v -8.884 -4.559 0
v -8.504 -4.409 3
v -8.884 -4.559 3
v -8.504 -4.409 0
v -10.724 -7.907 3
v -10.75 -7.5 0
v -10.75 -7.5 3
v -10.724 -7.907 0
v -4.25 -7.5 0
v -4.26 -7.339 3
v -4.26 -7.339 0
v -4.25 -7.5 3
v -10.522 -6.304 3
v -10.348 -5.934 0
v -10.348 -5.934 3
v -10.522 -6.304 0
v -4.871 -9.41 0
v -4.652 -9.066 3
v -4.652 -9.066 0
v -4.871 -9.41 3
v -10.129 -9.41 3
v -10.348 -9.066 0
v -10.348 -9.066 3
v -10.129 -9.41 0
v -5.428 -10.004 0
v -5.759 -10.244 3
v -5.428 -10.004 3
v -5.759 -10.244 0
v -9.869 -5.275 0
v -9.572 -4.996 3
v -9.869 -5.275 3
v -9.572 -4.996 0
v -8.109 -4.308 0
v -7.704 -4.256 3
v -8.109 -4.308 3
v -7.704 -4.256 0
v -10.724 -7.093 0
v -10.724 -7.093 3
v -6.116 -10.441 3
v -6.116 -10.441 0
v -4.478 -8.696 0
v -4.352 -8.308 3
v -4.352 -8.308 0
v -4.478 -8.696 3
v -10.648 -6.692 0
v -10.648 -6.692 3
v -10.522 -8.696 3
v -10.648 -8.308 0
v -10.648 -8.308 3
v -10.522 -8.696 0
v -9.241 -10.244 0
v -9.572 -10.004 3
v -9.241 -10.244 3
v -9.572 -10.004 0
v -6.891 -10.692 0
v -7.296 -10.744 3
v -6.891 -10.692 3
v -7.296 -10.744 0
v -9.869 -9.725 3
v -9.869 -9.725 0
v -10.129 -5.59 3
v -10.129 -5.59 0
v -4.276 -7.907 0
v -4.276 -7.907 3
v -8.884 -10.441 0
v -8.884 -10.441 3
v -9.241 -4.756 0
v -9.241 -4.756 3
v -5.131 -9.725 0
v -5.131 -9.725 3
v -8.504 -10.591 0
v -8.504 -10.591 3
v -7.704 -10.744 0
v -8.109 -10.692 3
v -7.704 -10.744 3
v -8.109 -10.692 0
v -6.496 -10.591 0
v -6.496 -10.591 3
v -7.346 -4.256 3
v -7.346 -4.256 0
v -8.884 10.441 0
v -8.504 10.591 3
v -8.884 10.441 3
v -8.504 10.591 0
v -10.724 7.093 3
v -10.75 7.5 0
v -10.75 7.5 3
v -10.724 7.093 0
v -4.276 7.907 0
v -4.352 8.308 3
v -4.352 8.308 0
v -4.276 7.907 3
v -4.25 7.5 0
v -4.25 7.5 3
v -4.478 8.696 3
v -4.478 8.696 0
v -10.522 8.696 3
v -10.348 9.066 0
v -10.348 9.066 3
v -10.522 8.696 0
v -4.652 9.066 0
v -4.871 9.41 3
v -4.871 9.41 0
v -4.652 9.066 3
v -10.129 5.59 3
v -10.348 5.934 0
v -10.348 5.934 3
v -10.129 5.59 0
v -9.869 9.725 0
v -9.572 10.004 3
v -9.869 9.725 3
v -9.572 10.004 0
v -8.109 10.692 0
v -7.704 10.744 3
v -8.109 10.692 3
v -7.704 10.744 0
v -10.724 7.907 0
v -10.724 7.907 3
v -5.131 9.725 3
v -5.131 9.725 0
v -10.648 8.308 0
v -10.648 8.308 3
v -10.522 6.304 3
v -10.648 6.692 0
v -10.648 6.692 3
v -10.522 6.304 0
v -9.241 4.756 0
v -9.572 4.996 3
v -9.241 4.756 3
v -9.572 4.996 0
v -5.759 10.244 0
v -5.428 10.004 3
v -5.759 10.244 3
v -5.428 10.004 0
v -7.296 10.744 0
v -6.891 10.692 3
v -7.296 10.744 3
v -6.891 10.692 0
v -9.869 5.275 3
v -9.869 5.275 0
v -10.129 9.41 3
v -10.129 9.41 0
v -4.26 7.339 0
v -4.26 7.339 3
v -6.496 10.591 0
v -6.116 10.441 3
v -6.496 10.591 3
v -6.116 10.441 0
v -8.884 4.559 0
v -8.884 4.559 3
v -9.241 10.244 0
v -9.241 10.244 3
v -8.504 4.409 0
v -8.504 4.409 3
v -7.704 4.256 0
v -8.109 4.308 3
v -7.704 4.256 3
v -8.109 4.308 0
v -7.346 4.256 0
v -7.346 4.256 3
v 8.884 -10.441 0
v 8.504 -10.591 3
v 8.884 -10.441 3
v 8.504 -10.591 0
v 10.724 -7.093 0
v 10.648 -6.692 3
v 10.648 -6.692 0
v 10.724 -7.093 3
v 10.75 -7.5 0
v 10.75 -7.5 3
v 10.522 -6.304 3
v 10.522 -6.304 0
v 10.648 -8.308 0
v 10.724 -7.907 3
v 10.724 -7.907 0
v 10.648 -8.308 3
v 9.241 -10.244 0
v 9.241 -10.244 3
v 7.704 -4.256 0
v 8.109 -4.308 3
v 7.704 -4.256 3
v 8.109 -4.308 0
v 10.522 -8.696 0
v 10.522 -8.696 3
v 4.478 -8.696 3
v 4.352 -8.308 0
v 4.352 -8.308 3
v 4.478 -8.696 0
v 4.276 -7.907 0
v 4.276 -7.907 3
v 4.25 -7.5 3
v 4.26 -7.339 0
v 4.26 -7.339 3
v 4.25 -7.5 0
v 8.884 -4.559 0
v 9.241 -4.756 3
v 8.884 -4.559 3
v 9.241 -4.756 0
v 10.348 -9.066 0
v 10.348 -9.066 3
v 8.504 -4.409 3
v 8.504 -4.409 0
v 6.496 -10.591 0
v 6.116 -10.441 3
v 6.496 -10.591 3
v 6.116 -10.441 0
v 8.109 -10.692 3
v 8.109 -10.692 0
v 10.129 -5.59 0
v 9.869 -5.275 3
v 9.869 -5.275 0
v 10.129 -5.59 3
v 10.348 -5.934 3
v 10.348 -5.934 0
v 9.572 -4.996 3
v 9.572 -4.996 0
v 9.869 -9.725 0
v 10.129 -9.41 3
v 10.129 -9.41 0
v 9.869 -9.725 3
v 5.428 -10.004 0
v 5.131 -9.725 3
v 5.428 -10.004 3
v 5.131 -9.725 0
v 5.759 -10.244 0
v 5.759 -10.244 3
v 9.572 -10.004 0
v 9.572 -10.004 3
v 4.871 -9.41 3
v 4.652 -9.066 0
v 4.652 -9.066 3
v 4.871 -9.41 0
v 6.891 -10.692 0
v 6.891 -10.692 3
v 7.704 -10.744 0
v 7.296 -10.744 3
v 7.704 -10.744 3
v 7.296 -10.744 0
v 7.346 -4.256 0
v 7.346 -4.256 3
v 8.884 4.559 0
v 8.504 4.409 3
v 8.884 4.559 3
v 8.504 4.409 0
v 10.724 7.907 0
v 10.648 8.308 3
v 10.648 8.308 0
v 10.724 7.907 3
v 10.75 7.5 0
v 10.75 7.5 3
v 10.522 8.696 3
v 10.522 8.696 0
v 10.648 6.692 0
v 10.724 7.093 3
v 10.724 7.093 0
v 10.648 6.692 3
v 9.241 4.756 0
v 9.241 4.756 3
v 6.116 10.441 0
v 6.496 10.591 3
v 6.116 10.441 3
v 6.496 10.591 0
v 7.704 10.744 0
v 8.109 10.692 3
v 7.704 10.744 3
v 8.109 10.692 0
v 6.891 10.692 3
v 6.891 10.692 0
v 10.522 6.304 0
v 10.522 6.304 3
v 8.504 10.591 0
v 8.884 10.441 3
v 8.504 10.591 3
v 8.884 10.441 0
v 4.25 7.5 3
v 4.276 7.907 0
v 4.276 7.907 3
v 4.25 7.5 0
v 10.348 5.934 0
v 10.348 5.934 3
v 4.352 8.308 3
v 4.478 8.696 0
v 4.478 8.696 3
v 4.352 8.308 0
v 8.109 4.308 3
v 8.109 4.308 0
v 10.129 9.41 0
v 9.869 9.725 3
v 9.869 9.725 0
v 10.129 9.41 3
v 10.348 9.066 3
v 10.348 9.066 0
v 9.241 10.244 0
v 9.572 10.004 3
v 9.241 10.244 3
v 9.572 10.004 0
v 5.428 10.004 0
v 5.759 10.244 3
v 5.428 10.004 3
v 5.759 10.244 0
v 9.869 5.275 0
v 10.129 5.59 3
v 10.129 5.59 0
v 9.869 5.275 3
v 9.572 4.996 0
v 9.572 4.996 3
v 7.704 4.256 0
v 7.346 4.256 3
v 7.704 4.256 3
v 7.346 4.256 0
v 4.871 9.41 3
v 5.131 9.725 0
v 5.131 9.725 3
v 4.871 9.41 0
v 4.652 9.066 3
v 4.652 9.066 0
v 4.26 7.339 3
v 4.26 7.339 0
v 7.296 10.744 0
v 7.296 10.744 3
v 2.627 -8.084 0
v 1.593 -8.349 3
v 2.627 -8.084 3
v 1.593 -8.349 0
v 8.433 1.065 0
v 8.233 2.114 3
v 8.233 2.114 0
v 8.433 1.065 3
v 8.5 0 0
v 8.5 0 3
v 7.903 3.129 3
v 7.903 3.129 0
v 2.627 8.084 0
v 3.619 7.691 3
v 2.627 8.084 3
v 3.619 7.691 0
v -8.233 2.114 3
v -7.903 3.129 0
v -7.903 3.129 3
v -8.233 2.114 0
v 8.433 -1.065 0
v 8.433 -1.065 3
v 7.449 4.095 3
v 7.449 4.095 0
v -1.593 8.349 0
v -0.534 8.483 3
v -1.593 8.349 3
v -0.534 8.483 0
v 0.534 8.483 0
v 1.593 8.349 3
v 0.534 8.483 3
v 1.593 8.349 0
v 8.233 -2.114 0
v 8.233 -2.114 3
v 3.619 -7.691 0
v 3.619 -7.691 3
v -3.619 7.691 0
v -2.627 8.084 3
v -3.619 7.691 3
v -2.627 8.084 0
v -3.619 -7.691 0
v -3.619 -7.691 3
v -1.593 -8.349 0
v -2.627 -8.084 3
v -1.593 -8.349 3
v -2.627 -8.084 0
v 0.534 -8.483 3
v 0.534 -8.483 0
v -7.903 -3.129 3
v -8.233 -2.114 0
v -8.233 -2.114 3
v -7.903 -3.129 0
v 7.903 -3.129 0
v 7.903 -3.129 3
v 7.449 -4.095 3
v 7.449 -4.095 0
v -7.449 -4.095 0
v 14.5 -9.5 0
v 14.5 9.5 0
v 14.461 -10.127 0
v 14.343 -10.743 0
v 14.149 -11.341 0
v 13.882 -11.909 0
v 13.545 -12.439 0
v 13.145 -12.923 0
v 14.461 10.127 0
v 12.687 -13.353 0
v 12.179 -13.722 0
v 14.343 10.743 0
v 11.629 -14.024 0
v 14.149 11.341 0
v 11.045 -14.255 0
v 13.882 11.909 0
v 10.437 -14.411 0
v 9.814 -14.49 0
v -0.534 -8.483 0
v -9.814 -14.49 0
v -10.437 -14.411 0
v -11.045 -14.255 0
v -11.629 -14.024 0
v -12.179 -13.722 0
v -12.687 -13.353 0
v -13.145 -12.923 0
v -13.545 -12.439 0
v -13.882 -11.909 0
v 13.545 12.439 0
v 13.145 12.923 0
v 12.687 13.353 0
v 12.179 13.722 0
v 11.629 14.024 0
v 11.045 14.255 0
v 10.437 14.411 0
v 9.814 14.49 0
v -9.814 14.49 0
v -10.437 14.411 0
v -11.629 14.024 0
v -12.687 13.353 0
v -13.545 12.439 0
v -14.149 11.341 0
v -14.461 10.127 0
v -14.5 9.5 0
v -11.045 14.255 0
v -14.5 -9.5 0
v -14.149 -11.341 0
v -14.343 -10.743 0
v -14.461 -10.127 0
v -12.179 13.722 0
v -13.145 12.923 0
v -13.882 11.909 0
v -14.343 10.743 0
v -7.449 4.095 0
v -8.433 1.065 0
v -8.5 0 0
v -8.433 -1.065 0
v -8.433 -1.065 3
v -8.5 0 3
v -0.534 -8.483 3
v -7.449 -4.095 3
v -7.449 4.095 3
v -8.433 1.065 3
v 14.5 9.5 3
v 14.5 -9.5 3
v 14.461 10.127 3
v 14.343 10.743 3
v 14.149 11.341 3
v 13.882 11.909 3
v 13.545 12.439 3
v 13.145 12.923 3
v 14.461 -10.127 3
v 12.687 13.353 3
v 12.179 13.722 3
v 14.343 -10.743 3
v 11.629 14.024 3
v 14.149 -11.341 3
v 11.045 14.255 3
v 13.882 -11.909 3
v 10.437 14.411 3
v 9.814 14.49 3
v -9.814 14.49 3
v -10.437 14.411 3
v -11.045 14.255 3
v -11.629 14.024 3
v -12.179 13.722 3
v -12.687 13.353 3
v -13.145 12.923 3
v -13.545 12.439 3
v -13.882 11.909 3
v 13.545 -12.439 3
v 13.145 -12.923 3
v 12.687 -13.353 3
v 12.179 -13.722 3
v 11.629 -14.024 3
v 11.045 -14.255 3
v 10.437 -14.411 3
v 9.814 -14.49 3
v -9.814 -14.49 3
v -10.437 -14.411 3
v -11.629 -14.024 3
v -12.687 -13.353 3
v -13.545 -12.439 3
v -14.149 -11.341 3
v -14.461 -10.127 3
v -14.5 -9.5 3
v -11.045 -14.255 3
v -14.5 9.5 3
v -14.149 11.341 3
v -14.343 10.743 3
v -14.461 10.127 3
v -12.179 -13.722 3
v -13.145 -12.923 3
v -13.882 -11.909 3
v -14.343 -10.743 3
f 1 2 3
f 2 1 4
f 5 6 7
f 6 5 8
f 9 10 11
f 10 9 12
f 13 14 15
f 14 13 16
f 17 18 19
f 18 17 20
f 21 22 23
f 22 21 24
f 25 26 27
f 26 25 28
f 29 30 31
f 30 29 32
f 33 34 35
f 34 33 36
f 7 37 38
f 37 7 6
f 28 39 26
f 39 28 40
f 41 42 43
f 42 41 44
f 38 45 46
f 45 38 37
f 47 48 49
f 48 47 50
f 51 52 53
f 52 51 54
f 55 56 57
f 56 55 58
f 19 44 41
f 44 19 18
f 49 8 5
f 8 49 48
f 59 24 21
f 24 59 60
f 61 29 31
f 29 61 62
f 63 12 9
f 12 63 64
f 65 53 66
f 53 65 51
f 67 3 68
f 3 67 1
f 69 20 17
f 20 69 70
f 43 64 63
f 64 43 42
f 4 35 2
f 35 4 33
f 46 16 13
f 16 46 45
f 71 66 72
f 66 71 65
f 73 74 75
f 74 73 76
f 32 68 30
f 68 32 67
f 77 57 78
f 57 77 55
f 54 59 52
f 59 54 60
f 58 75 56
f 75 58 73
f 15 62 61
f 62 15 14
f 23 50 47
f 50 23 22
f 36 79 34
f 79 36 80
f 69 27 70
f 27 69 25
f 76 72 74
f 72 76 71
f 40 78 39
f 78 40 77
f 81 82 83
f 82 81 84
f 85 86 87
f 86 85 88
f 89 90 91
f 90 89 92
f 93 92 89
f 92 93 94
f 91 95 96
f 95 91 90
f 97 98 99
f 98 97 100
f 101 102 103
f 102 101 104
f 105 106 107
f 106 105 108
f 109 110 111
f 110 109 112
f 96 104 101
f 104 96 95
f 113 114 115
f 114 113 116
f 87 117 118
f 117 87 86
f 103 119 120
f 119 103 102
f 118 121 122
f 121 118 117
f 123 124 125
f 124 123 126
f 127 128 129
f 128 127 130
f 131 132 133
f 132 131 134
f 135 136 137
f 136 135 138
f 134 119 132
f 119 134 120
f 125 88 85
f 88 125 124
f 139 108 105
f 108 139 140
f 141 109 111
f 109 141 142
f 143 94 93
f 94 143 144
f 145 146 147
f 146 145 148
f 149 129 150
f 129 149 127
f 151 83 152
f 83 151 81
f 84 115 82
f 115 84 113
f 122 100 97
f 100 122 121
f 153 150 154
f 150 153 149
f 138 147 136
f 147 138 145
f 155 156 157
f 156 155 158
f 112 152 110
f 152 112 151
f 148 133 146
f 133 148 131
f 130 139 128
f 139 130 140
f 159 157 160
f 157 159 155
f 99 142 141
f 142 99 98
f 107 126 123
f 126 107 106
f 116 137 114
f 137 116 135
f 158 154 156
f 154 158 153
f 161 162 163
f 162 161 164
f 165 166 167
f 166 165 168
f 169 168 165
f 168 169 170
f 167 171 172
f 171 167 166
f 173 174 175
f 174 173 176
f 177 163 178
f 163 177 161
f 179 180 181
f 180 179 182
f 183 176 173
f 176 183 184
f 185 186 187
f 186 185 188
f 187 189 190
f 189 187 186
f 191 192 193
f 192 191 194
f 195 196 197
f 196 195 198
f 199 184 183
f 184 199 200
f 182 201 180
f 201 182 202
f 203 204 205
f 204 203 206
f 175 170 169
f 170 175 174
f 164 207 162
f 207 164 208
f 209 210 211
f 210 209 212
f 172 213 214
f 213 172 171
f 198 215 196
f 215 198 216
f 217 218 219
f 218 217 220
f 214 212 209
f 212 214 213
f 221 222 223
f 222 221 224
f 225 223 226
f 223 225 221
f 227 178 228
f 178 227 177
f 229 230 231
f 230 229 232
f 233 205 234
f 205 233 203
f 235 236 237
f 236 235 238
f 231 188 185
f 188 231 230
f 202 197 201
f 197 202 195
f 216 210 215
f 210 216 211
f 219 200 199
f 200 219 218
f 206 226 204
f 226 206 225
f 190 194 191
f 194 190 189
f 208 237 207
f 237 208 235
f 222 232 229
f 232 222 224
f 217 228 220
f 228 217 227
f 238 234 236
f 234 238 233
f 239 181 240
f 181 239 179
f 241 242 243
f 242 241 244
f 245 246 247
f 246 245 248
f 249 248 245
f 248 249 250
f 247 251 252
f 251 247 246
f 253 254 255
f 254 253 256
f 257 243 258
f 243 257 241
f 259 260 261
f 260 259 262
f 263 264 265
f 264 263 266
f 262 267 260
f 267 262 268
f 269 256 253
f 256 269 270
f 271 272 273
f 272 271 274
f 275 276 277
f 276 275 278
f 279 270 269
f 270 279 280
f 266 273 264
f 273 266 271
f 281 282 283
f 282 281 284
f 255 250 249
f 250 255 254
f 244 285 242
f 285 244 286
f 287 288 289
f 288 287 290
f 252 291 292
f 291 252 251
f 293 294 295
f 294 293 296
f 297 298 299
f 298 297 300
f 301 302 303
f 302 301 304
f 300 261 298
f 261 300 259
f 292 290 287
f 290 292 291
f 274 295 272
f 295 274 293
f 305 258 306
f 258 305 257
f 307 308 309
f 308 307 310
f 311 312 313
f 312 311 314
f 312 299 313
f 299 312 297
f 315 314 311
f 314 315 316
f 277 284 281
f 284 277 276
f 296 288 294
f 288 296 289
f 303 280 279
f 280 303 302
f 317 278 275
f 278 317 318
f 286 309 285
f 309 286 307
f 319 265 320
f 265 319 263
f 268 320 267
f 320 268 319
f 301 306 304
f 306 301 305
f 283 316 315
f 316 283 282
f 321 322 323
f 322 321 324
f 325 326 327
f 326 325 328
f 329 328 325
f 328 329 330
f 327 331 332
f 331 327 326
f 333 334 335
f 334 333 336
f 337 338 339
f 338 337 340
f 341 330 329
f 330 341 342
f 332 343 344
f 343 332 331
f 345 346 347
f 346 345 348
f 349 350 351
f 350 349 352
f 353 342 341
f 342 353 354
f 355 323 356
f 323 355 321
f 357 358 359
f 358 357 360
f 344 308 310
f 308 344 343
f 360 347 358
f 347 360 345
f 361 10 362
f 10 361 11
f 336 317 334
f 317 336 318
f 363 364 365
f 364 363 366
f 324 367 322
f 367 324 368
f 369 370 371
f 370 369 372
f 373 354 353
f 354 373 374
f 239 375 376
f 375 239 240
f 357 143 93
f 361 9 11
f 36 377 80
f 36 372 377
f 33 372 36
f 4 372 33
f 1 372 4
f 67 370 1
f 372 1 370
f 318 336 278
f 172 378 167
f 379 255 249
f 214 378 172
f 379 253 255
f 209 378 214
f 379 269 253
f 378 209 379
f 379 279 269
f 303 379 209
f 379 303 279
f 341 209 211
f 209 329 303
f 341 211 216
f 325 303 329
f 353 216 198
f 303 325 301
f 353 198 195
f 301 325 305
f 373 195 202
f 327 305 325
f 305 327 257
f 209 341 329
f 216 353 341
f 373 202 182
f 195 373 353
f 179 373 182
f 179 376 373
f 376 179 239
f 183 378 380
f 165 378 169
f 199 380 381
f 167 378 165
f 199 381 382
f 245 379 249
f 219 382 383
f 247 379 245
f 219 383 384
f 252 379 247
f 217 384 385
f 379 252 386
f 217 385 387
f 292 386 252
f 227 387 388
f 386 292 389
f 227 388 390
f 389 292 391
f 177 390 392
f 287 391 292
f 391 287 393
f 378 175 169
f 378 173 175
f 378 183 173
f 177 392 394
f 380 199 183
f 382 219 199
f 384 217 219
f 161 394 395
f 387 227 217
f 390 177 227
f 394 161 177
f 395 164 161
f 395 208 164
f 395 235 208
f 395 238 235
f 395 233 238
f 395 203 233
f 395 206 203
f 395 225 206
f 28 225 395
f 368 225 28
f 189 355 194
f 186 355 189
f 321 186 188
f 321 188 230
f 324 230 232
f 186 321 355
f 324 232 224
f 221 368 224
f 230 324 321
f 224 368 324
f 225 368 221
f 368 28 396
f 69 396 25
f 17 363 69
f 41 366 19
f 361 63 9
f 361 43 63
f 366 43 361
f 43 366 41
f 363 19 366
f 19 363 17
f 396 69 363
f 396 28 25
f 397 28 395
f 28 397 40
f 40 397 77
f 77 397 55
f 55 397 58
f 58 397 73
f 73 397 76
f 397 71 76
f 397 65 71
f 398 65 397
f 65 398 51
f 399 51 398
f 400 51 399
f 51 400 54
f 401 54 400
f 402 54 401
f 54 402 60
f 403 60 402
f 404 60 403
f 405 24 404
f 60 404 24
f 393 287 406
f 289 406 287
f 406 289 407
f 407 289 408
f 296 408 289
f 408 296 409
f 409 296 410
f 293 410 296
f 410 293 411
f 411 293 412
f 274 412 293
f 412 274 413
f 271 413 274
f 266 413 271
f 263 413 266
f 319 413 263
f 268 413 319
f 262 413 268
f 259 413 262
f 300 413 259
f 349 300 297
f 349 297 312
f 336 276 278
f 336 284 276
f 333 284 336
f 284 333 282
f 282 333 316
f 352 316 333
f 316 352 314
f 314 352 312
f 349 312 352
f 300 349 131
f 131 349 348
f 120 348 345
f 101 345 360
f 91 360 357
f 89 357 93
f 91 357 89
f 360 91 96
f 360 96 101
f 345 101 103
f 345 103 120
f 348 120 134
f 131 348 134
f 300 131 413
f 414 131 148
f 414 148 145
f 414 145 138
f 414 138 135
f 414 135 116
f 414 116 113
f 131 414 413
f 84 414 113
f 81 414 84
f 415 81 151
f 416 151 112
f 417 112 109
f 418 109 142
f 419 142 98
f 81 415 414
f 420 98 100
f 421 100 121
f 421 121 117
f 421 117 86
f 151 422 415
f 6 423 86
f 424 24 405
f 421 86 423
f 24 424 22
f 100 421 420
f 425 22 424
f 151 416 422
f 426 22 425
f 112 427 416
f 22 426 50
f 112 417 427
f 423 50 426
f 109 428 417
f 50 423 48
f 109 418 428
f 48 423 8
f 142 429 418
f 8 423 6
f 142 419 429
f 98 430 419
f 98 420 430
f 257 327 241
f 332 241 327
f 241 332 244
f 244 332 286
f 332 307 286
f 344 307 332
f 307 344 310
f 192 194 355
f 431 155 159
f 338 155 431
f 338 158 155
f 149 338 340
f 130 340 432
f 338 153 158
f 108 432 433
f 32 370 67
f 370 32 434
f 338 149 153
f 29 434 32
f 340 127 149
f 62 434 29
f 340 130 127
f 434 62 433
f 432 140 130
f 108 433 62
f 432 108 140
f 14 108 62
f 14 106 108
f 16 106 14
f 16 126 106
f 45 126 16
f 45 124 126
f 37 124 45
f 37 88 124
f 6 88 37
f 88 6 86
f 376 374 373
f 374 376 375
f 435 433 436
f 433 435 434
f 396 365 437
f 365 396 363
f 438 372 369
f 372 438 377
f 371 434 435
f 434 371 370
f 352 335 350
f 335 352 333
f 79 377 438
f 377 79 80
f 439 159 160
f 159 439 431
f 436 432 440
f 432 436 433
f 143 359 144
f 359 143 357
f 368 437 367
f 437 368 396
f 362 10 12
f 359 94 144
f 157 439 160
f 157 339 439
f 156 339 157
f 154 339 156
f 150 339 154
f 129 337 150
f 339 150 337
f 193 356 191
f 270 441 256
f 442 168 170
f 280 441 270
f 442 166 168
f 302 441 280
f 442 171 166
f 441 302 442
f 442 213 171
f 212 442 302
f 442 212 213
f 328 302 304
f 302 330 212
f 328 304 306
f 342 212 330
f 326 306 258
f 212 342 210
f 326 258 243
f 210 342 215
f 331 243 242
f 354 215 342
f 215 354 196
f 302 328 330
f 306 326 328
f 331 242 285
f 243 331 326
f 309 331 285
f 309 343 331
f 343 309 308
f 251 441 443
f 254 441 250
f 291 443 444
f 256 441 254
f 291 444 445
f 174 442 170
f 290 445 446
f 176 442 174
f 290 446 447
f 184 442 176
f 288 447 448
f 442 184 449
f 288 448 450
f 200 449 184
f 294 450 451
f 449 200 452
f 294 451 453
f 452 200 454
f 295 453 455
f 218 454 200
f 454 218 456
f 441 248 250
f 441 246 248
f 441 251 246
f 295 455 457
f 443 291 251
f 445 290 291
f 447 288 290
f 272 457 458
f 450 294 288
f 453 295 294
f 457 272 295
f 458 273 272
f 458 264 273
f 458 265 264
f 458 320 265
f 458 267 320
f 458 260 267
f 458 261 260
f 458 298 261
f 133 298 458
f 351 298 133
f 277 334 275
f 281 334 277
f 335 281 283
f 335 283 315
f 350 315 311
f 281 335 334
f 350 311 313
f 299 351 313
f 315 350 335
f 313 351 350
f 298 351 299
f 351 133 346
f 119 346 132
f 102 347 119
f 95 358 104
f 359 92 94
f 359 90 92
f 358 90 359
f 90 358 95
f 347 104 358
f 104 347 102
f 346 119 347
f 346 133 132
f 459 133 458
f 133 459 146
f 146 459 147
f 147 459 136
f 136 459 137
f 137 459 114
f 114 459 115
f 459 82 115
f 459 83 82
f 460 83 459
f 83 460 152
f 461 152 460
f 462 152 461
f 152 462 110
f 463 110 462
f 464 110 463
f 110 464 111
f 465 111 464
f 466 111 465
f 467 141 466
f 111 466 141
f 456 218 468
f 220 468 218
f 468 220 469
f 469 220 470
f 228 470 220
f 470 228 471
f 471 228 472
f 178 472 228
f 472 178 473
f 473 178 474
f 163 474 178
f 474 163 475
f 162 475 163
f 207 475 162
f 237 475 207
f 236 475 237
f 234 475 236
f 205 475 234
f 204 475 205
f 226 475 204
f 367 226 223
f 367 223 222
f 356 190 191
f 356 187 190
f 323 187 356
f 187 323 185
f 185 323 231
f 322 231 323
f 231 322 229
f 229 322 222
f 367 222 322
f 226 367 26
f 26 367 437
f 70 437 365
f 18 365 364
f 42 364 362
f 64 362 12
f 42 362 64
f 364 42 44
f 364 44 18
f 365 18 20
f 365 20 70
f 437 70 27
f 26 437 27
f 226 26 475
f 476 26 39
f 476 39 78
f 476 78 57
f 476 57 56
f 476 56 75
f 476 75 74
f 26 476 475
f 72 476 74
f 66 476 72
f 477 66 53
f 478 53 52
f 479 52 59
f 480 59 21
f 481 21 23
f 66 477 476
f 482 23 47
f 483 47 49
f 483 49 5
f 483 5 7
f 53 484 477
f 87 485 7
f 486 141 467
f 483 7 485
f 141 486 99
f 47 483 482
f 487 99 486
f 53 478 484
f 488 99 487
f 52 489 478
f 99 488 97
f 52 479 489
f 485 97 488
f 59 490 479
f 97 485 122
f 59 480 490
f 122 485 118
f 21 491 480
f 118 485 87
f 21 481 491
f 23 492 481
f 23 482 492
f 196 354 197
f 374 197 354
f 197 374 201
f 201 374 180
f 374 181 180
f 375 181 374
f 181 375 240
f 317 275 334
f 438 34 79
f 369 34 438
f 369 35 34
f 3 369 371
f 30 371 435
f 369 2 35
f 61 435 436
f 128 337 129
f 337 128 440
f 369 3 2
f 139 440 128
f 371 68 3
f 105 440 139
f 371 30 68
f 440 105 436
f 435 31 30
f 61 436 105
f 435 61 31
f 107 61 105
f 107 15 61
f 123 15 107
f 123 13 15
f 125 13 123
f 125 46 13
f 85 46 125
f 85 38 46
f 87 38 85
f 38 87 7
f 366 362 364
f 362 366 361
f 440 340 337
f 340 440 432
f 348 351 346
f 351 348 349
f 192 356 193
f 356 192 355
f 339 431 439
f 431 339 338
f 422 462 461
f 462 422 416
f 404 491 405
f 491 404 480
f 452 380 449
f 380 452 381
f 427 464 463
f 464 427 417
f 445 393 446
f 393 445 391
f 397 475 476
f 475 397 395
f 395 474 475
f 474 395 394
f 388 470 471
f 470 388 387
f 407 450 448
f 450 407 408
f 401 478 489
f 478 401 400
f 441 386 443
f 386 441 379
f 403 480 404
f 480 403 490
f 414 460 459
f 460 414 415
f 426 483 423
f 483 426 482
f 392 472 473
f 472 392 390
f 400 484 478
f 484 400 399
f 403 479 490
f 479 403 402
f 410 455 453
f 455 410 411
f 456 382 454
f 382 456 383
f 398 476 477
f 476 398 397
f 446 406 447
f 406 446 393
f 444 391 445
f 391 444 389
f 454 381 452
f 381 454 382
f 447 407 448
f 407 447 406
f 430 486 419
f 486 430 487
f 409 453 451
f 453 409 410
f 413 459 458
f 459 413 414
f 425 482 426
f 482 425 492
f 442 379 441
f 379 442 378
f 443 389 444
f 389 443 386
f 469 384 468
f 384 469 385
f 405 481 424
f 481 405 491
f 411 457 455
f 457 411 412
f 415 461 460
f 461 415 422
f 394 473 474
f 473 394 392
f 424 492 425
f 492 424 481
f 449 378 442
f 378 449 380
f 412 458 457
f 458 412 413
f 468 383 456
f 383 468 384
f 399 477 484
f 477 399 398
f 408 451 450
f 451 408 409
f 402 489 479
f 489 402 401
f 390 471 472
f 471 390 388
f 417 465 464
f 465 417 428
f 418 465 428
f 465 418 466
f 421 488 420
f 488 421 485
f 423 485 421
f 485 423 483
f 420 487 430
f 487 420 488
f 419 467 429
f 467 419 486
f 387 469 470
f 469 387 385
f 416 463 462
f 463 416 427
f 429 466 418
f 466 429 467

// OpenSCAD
$fn = 50;

difference() {
	union() {
		hull() {
			translate(v = [-9.5, 9.5, 0]) {
				cylinder(h = 3, r = 5);
			}
			translate(v = [9.5, 9.5, 0]) {
				cylinder(h = 3, r = 5);
			}
			translate(v = [-9.5, -9.5, 0]) {
				cylinder(h = 3, r = 5);
			}
			translate(v = [9.5, -9.5, 0]) {
				cylinder(h = 3, r = 5);
			}
		}
	}
	union() {
		translate(v = [-7.5, -7.5, -100.0]) {
			cylinder(h = 200, r = 3.25);
		}
		translate(v = [-7.5, 7.5, -100.0]) {
			cylinder(h = 200, r = 3.25);
		}
		translate(v = [7.5, -7.5, -100.0]) {
			cylinder(h = 200, r = 3.25);
		}
		translate(v = [7.5, 7.5, -100.0]) {
			cylinder(h = 200, r = 3.25);
		}
		translate(v = [-7.5, -7.5, -100.0]) {
			cylinder(h = 200, r = 1.8);
		}
		translate(v = [-7.5, 7.5, -100.0]) {
			cylinder(h = 200, r = 1.8);
		}
		translate(v = [7.5, -7.5, -100.0]) {
			cylinder(h = 200, r = 1.8);
		}
		translate(v = [7.5, 7.5, -100.0]) {
			cylinder(h = 200, r = 1.8);
		}
		cylinder(h = 3, r = 8.5);
	}
}
